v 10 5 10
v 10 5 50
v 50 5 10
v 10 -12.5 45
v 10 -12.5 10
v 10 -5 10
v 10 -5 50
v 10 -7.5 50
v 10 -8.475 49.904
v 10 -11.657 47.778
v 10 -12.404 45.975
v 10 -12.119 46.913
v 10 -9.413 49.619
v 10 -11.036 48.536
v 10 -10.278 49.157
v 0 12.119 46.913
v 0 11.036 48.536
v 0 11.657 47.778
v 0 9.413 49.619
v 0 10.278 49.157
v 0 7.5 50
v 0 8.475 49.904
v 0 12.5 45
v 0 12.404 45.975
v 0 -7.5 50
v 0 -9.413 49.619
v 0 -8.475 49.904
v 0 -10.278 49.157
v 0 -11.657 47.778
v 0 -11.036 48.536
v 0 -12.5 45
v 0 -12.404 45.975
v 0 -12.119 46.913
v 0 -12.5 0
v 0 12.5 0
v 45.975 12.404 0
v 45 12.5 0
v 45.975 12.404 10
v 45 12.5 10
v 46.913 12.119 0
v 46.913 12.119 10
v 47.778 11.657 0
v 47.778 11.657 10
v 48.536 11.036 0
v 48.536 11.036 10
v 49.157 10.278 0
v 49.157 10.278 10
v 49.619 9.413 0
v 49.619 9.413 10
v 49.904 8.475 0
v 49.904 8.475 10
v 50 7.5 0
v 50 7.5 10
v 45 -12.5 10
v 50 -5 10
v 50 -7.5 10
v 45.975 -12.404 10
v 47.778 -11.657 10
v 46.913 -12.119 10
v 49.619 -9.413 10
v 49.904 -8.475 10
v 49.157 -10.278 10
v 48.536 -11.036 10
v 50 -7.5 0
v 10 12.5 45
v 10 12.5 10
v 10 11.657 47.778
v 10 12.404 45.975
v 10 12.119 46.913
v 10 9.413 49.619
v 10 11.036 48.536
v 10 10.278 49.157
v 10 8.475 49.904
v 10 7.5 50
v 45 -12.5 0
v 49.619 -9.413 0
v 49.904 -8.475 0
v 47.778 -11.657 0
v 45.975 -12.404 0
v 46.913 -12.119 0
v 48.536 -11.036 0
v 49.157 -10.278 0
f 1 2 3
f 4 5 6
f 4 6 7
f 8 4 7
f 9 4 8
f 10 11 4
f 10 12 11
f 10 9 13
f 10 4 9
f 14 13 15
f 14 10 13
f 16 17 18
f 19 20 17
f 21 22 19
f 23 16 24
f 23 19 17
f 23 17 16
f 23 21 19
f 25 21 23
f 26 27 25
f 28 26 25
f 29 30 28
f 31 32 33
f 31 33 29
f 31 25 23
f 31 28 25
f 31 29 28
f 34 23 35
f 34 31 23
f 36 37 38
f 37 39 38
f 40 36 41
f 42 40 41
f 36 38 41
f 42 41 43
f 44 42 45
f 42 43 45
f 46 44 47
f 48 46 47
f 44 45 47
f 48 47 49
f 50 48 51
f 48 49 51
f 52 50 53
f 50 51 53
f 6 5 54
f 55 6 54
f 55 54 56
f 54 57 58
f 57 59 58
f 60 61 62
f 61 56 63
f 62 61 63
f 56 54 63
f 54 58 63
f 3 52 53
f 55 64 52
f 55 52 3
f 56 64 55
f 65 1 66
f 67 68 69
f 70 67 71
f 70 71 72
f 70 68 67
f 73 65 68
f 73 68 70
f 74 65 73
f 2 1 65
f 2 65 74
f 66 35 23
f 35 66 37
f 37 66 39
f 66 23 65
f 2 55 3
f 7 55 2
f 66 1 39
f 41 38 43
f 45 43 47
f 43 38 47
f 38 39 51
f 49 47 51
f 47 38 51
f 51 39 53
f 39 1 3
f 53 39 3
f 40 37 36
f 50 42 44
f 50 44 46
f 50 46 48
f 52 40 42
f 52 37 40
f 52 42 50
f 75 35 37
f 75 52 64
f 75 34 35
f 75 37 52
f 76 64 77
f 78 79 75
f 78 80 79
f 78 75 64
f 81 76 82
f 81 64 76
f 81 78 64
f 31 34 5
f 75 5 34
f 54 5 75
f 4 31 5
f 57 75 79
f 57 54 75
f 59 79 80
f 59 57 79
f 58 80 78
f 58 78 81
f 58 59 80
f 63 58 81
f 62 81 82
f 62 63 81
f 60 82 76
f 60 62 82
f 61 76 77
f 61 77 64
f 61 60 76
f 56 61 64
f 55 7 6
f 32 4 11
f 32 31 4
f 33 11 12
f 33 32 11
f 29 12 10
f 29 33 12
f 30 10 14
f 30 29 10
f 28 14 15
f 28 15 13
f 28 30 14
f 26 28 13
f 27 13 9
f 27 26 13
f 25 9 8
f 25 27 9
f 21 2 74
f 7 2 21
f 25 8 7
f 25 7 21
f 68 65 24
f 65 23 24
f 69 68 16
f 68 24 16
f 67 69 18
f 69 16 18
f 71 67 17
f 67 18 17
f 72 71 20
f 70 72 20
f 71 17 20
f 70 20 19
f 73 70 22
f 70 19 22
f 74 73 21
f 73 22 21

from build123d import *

# Parameters (mm, degrees)
F0_W     = 40
F0_H     = 10
F1_DEPTH = 12.5
F2_DEPTH = 5
F3_R     = 5


with BuildPart() as f1:
    # F0 (on Front) → F1 (new body, symmetric)
    with BuildSketch(Plane.XZ):
        Polygon((0, 50), (0, 0), (10, 0), (10, 10), (10, 50), align=None)
        with Locations((30, 5)):
            Rectangle(F0_W, F0_H)
    extrude(amount=F1_DEPTH, both=True)

    # F0 (on Front) → F2 (join, symmetric)
    with BuildSketch(Plane.XZ):
        Polygon((10, 50), (10, 10), (50, 10), align=None)
    extrude(amount=F2_DEPTH, both=True)

    # F3
    f3_edges = [f1.edges().sort_by_distance(p)[0] for p in [
        (50, -12.5, 5),
        (50, 12.5, 5),
        (5, 12.5, 50),
        (5, -12.5, 50),
    ]]
    fillet(f3_edges, radius=F3_R)


solid = f1.part
